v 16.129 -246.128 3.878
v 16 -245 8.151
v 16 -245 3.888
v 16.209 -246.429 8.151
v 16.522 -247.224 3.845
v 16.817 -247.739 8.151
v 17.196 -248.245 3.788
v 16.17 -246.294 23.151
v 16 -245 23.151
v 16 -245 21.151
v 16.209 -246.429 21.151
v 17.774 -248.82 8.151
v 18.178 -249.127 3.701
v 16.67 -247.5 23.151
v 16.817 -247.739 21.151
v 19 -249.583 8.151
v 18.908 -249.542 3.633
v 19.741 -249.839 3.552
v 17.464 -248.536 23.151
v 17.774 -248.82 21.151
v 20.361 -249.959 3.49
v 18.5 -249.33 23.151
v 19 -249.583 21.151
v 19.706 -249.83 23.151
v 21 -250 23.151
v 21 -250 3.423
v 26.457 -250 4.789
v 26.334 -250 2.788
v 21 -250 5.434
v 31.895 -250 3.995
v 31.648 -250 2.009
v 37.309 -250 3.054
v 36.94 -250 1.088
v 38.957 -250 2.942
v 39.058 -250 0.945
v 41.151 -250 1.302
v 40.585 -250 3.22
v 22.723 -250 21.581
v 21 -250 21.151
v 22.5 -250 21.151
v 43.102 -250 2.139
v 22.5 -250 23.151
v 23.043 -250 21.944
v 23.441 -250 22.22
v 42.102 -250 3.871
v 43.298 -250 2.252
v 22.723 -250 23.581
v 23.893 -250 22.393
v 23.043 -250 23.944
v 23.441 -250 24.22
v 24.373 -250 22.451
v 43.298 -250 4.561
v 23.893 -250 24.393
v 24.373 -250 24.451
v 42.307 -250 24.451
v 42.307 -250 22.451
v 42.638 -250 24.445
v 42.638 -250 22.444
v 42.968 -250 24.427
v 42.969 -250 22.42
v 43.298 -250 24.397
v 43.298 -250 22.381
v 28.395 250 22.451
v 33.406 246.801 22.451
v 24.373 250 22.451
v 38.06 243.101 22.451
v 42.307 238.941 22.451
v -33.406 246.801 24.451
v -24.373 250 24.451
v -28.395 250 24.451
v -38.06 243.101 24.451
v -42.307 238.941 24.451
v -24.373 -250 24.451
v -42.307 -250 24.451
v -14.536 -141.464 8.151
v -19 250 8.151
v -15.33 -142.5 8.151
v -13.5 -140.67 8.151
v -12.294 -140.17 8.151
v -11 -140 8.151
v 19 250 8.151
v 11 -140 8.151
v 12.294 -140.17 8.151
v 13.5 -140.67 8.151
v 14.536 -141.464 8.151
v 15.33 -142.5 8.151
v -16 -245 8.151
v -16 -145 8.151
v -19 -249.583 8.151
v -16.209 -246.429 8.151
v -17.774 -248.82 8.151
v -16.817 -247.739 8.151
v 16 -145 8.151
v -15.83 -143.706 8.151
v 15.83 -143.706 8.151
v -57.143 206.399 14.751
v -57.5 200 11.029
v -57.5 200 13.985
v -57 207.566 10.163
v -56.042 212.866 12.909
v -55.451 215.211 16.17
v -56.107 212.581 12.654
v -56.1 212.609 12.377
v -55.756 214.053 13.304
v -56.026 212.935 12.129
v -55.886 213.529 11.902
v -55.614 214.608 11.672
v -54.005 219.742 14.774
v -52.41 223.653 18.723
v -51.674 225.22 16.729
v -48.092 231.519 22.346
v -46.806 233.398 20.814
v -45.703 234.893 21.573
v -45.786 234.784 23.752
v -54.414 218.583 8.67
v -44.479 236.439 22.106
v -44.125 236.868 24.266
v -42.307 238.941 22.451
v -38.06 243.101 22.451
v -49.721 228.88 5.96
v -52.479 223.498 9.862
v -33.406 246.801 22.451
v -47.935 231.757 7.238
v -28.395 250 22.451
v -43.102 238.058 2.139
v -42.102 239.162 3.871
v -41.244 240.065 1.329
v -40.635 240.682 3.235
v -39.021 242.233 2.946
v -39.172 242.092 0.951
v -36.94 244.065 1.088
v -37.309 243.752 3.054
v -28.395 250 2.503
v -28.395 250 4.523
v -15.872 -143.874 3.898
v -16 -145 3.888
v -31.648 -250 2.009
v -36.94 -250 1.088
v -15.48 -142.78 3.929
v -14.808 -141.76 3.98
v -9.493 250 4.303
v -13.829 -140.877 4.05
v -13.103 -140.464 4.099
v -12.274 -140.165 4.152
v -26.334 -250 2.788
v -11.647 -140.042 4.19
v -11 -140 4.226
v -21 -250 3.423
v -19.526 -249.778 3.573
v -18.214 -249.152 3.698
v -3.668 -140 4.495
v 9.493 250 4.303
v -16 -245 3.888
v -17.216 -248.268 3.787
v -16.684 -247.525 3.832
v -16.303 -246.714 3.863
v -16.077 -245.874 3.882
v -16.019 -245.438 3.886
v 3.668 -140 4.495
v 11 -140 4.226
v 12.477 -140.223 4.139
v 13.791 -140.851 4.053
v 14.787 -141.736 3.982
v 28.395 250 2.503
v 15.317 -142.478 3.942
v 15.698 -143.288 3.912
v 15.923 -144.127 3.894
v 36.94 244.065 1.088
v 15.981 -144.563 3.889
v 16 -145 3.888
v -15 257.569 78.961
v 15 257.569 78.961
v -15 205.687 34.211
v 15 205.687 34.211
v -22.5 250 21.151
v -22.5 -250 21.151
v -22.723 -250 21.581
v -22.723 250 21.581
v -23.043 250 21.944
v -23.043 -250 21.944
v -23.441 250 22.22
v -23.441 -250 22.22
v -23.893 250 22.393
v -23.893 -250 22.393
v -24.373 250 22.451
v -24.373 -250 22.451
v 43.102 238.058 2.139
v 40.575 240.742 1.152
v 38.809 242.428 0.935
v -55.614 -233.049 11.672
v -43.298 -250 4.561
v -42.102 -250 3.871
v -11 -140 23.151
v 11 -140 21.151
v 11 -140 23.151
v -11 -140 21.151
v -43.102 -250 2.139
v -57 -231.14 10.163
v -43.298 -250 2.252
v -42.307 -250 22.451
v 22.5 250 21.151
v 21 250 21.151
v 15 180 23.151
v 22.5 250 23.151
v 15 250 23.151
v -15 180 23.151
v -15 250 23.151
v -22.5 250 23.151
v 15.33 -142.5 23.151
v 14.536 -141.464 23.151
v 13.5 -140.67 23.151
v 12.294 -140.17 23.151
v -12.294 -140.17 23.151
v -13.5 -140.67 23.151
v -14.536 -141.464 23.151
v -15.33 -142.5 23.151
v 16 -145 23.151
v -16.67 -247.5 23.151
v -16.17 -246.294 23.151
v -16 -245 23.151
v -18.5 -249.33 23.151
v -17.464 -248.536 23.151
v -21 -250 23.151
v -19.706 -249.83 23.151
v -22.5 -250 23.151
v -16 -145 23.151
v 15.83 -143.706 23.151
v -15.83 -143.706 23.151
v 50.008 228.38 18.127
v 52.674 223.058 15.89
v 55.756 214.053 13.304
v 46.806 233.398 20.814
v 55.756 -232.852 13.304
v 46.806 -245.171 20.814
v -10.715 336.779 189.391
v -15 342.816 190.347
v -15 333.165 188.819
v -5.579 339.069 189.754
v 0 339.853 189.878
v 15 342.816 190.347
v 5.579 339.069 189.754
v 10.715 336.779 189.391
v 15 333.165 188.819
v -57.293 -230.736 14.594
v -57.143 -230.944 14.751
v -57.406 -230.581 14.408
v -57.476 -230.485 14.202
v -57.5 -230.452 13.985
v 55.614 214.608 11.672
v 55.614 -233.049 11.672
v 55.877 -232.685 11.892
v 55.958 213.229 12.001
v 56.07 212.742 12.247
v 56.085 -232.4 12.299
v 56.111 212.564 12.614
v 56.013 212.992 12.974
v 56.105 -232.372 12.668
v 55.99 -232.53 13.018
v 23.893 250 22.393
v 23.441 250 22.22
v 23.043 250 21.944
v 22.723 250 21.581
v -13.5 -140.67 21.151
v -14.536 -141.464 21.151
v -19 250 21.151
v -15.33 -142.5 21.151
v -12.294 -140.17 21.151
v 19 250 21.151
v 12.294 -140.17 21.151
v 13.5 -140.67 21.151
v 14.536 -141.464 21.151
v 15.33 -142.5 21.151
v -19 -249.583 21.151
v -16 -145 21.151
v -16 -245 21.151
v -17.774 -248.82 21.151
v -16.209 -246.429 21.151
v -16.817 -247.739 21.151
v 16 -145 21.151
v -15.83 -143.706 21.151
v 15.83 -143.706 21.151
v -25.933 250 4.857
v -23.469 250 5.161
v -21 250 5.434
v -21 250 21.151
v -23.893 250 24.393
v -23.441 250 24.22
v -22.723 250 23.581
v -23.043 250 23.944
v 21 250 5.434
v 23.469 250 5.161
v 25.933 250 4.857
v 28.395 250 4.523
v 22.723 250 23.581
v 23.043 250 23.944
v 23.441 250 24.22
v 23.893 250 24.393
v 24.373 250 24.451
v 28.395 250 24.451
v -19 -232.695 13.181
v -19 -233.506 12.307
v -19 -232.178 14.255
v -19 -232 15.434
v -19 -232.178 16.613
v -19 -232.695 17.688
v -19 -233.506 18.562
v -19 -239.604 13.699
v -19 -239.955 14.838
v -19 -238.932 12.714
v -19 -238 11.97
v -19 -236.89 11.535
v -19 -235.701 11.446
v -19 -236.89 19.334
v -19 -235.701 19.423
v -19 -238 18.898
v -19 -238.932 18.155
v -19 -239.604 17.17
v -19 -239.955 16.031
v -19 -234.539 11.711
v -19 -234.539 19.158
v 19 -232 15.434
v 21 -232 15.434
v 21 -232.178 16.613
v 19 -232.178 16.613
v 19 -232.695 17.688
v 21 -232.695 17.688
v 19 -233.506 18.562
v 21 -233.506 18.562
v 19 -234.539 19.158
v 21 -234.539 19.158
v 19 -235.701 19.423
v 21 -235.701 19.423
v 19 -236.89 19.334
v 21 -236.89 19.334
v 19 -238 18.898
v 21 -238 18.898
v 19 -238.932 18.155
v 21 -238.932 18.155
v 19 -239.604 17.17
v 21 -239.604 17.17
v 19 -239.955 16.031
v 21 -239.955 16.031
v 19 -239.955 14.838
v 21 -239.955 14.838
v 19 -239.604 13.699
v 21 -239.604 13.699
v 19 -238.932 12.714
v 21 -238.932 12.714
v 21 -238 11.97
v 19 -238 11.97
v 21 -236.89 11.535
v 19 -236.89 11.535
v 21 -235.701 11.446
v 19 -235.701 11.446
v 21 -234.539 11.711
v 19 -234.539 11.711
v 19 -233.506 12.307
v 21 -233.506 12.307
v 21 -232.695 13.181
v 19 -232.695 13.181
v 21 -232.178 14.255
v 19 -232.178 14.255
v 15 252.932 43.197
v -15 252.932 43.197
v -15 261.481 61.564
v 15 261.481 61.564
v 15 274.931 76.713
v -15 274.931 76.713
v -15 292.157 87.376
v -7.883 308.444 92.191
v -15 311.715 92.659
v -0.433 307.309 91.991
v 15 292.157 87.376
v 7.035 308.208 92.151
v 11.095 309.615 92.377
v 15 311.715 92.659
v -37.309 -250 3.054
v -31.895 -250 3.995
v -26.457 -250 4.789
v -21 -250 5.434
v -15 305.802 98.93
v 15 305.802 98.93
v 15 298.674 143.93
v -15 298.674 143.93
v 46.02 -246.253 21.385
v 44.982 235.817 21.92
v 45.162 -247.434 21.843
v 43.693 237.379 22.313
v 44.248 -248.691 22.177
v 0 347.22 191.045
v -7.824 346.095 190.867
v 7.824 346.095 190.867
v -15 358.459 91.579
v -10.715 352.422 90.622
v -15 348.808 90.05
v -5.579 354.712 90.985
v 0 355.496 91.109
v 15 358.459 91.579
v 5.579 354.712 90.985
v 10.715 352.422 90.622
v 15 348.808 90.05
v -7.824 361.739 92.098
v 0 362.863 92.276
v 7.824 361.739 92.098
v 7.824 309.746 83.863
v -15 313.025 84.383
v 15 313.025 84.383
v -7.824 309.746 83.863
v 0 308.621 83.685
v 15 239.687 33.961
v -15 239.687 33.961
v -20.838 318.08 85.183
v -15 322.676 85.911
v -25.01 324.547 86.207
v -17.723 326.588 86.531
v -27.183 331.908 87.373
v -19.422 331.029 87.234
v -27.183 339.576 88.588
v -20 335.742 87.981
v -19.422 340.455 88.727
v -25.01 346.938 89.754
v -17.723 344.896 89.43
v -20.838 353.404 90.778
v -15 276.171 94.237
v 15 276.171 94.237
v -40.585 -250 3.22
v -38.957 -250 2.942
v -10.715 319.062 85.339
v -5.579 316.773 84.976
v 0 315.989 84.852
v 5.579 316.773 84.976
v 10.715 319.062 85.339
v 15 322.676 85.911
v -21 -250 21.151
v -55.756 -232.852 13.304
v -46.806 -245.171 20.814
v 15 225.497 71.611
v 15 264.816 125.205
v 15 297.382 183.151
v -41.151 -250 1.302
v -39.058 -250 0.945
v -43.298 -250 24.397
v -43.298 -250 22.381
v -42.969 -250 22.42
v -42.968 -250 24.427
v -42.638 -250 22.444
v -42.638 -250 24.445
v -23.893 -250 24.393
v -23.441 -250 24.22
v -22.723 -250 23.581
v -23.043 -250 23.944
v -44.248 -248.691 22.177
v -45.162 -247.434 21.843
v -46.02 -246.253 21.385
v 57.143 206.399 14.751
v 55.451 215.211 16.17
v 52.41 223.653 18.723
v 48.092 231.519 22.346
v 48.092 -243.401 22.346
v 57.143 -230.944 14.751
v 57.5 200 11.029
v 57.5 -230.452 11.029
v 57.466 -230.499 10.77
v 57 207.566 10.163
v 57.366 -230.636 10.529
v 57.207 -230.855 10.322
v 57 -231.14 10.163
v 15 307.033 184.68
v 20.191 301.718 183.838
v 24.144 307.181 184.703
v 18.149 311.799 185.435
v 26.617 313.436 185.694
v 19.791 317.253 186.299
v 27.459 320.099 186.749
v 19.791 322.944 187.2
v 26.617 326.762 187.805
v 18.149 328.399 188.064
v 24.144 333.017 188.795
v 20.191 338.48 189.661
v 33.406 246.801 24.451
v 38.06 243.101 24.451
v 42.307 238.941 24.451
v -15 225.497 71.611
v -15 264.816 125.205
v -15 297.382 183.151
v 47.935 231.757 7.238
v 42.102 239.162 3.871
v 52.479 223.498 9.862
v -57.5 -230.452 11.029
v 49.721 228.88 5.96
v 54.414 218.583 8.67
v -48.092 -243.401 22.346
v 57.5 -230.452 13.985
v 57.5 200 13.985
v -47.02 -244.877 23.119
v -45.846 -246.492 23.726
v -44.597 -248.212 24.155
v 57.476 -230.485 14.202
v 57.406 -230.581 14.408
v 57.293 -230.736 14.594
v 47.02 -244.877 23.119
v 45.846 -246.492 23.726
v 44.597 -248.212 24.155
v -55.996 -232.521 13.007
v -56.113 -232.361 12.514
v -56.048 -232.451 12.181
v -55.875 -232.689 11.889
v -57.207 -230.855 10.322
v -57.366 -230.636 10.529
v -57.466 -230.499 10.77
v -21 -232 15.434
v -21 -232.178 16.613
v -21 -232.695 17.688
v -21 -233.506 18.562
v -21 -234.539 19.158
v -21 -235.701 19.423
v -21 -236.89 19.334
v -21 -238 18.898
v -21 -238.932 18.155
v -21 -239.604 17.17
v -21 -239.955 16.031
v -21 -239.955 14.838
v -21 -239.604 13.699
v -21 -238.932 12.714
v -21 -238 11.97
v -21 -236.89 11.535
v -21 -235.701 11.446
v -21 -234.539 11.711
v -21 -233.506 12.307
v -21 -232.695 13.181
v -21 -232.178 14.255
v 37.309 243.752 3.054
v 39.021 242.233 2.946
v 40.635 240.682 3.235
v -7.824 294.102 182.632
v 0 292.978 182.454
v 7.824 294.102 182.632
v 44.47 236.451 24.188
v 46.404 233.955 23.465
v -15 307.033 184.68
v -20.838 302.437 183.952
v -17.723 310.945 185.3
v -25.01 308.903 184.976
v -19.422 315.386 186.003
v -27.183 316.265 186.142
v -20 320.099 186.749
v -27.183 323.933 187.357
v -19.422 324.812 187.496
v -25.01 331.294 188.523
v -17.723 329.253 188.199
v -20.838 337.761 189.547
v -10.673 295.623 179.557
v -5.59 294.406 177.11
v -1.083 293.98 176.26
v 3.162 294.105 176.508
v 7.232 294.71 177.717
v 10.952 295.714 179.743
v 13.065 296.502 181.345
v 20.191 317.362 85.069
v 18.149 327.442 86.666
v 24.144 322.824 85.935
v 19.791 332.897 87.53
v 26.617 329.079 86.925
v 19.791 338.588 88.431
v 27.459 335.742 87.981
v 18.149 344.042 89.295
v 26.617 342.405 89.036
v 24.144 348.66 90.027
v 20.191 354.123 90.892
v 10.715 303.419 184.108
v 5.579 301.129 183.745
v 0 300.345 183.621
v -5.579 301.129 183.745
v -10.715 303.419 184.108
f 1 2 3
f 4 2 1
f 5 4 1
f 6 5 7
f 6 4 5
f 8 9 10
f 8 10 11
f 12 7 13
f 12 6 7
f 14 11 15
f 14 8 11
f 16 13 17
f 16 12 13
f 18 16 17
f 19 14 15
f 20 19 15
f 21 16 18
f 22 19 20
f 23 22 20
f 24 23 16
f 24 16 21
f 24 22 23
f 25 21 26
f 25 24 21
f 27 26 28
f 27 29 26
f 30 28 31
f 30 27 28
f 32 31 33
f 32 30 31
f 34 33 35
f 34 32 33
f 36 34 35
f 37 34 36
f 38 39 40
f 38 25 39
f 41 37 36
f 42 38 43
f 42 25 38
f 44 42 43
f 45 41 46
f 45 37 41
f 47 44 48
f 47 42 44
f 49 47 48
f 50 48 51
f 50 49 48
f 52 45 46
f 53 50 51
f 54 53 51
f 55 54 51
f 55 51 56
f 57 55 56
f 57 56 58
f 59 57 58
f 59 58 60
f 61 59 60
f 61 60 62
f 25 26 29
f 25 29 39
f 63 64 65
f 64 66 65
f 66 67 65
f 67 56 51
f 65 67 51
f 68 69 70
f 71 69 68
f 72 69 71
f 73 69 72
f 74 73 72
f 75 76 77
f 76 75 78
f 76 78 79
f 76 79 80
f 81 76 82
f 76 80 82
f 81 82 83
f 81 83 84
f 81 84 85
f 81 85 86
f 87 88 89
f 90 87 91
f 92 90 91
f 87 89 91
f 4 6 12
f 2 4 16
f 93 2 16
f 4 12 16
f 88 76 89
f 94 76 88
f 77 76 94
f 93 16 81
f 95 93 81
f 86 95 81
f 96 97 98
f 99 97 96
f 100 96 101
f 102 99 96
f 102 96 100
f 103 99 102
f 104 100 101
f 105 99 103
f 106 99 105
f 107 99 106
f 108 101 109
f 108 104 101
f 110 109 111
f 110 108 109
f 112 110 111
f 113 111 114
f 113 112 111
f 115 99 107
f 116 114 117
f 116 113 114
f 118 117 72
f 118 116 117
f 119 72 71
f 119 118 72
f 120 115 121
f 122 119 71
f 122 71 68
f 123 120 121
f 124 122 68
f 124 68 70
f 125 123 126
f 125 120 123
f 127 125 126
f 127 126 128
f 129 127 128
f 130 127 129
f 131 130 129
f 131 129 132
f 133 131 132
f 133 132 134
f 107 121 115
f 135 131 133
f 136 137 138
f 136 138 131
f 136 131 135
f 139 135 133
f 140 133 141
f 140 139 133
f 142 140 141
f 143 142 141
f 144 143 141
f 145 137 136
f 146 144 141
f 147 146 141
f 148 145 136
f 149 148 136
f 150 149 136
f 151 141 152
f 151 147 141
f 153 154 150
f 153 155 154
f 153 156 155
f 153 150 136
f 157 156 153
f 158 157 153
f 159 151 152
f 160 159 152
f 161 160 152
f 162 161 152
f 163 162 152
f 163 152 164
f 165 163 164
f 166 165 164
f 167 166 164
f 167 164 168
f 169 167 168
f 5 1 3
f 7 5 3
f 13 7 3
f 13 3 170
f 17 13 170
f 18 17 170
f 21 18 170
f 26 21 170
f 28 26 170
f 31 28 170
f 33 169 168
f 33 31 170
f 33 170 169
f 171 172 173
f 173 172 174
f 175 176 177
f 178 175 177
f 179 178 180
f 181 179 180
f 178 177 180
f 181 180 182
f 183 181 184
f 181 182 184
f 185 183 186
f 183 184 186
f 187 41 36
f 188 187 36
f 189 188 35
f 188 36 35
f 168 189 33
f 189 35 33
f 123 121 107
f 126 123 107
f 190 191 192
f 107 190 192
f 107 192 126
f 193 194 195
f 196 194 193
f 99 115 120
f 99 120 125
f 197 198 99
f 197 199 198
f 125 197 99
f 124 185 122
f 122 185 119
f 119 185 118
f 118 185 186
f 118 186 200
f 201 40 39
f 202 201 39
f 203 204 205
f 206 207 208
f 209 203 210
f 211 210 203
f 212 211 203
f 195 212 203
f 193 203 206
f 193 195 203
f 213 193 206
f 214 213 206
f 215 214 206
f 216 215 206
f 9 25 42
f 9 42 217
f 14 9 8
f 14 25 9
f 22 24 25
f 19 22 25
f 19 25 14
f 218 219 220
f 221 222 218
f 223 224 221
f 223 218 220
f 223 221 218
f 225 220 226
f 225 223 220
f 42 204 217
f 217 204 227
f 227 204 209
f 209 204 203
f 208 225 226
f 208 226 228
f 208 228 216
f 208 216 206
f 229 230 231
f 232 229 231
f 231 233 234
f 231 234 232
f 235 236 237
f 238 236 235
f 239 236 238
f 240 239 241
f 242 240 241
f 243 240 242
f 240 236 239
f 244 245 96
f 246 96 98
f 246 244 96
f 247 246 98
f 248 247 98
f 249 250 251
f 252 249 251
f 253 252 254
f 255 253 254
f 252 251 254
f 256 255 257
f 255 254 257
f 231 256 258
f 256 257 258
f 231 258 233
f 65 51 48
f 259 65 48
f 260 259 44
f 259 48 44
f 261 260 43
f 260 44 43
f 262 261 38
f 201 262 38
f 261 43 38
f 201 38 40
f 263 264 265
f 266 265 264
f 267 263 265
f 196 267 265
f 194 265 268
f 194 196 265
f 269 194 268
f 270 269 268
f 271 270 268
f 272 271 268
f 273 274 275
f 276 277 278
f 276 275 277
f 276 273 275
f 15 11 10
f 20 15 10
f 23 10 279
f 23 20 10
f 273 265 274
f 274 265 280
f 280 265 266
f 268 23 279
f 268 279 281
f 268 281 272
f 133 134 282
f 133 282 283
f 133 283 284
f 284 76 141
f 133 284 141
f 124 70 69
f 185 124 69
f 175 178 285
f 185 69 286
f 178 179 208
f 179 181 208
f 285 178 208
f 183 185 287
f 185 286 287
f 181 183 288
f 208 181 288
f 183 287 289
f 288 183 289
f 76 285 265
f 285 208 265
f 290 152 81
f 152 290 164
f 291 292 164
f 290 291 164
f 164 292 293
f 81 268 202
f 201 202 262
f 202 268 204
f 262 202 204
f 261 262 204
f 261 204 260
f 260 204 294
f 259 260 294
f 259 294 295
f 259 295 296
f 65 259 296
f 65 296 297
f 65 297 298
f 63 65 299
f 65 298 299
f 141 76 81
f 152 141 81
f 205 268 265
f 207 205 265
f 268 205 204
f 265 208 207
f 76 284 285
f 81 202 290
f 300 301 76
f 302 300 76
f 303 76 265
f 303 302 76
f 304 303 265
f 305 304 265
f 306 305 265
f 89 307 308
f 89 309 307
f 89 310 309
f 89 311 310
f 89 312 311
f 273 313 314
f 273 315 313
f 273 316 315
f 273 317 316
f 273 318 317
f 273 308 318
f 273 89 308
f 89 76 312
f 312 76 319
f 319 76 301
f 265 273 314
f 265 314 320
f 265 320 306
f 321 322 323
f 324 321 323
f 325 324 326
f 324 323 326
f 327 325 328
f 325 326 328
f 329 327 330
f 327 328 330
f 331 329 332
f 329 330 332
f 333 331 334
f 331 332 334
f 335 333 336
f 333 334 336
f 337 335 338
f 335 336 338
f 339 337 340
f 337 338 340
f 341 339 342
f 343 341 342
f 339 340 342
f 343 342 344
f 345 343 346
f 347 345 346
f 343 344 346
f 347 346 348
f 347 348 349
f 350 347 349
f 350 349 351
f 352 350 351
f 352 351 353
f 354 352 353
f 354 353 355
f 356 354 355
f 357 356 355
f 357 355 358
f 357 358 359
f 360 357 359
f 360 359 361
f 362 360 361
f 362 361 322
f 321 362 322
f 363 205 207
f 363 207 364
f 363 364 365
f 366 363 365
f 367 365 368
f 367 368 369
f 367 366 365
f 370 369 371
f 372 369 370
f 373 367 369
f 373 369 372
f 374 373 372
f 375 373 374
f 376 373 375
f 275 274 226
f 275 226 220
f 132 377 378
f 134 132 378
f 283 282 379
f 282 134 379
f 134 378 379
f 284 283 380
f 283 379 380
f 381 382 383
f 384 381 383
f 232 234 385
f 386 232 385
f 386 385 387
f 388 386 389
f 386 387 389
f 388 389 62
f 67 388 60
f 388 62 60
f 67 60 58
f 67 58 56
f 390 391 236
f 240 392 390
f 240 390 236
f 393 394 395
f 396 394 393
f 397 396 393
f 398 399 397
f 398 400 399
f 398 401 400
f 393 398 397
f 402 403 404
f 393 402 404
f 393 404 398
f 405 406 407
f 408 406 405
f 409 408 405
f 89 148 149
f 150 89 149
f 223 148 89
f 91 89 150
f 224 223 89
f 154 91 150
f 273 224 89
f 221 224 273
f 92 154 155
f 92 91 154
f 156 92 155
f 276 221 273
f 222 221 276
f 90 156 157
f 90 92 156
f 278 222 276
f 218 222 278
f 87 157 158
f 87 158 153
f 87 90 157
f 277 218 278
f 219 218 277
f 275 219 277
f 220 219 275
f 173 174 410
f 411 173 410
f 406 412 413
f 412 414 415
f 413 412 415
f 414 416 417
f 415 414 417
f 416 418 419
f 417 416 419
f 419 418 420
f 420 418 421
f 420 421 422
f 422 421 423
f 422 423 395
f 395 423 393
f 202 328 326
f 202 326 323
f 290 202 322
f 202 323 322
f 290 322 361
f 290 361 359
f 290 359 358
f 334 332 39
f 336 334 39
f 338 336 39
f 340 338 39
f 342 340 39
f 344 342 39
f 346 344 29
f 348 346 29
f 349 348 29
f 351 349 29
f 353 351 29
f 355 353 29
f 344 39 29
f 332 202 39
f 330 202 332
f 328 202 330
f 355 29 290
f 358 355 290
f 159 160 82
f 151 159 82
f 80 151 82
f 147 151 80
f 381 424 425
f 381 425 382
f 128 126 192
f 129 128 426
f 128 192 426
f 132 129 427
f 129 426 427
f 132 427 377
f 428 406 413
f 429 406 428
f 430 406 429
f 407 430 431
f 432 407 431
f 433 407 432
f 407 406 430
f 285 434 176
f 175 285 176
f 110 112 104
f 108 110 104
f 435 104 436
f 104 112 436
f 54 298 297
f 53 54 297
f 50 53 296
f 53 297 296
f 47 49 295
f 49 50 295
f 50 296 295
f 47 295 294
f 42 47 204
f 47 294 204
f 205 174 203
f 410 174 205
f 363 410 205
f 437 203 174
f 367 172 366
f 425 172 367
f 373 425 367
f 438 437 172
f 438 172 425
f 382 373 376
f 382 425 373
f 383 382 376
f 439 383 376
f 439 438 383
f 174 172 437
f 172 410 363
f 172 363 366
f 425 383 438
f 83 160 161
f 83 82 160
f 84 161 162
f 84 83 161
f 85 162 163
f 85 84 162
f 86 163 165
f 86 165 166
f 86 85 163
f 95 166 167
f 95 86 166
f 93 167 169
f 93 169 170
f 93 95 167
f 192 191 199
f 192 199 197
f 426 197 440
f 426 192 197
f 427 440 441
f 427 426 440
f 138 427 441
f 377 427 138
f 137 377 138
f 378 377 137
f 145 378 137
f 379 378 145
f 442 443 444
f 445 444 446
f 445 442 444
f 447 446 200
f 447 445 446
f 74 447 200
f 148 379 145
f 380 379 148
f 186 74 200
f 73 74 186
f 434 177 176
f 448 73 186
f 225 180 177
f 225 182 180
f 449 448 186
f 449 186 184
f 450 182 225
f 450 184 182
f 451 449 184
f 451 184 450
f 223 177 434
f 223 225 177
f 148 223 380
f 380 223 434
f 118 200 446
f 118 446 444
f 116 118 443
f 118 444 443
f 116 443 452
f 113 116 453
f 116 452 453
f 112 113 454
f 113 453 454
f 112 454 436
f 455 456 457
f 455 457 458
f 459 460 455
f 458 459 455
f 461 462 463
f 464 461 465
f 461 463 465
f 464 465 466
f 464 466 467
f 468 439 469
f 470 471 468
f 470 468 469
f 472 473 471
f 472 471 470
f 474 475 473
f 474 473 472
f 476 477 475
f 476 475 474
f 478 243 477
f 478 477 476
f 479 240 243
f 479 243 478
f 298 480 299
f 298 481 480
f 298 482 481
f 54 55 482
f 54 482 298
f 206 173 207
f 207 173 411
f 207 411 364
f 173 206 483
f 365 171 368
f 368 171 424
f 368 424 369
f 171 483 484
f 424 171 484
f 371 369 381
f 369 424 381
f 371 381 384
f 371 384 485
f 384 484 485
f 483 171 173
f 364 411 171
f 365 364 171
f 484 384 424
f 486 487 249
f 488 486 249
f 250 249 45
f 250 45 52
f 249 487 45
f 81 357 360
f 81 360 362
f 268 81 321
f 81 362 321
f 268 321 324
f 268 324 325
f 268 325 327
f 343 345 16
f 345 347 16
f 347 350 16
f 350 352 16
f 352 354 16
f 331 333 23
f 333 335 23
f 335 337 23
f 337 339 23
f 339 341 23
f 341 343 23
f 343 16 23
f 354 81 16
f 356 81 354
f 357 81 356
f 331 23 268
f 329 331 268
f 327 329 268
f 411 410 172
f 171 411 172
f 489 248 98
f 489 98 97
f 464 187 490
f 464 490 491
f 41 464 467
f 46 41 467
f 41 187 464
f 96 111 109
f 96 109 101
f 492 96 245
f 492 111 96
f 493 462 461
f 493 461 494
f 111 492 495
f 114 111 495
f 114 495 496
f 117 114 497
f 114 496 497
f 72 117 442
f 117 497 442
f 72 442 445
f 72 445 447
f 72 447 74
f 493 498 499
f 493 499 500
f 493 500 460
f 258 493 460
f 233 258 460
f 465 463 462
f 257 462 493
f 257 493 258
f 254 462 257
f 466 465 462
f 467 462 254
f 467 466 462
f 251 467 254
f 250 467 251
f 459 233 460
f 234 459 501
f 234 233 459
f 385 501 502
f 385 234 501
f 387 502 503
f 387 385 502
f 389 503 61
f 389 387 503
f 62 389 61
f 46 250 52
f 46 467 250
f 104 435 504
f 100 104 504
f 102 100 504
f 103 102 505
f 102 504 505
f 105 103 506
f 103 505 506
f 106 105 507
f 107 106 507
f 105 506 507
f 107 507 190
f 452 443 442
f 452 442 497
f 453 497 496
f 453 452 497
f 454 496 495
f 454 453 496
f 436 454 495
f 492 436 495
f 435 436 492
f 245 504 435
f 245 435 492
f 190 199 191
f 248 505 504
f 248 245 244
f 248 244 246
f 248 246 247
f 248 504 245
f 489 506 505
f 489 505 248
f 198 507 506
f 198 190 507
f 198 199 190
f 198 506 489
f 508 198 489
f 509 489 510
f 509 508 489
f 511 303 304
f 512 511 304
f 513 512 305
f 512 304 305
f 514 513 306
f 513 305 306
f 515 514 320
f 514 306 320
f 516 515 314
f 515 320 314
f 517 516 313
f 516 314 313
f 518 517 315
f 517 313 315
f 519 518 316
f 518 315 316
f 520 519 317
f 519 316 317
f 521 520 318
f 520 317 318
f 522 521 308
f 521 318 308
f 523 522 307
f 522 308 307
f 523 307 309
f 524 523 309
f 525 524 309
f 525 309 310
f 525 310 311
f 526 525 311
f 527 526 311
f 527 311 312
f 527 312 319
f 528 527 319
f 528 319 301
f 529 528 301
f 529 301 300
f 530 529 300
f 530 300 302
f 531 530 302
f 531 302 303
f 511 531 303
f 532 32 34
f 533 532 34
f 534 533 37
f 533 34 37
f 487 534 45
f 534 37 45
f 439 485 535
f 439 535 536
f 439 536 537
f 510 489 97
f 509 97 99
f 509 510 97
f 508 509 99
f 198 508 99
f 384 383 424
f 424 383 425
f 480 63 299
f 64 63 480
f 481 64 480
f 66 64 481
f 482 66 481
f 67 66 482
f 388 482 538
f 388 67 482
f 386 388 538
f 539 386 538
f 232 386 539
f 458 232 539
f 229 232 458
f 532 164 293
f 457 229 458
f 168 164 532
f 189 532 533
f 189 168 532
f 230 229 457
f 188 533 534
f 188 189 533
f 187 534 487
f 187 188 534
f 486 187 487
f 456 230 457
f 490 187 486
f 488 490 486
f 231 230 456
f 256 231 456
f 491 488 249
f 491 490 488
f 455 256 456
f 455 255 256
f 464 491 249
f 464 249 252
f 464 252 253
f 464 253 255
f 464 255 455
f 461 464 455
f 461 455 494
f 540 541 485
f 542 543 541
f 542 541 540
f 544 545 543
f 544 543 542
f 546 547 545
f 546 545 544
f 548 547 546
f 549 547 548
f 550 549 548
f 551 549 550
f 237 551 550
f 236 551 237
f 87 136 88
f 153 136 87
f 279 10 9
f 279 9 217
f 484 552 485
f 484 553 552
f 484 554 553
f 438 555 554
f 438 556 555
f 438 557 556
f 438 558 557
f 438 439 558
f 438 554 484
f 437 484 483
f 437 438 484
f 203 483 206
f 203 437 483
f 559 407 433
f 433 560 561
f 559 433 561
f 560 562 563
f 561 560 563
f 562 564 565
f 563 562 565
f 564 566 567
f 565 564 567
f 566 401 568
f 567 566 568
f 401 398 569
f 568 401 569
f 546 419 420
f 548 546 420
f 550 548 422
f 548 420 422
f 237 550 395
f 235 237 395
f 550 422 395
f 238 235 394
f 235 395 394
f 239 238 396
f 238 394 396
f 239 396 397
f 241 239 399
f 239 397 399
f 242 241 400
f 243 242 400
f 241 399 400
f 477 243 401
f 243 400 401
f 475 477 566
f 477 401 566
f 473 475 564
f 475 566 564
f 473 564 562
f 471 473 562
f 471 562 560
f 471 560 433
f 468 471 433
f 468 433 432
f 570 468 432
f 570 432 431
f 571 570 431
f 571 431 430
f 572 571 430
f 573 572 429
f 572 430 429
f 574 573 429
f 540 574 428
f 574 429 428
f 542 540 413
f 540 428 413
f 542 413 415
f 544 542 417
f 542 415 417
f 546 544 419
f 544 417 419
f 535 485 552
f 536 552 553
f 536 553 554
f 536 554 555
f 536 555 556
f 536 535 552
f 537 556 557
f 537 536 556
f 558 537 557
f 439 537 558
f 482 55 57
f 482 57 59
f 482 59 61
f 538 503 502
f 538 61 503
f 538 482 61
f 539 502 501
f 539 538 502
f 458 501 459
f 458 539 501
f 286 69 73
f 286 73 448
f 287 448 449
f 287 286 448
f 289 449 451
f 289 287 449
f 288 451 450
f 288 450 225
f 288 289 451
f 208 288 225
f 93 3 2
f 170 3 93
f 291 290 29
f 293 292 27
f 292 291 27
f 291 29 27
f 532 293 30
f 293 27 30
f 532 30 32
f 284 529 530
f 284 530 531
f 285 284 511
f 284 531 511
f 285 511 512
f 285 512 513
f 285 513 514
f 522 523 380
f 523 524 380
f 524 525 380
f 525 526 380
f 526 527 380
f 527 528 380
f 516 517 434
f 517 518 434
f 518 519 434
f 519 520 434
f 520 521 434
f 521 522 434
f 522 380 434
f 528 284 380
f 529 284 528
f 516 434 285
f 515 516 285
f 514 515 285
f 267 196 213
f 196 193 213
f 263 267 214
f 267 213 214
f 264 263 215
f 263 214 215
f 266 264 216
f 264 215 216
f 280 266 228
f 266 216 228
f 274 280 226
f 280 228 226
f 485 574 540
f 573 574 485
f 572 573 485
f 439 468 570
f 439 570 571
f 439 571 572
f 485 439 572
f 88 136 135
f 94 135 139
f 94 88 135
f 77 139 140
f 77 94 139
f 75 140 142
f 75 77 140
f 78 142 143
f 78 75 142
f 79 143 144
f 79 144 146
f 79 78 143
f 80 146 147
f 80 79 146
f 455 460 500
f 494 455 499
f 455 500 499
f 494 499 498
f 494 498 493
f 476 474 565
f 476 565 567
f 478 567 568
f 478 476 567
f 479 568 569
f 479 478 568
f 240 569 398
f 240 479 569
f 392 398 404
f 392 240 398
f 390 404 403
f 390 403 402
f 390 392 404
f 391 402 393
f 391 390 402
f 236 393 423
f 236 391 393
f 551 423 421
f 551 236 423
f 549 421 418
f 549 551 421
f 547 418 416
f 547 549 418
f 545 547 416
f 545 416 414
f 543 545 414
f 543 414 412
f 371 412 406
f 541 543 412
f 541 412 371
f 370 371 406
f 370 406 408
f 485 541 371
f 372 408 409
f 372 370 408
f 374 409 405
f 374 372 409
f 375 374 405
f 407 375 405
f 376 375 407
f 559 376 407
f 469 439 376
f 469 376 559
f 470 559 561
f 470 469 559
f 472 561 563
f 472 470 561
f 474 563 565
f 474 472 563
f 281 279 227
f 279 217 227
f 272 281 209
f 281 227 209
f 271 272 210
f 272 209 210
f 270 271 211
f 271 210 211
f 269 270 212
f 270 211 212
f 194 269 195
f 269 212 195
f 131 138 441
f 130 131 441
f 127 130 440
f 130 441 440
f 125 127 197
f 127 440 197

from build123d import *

# Parameters (mm, degrees)
F1_DEPTH       = 250
F2_W           = 38
F2_H           = 13
F3_DEPTH       = 250
F4_T1_DEPTH    = 509.3674969976
F5_R           = 9
F6_R           = 1
F8_DEPTH       = 500.001
F10_DEPTH      = 24.4523840141
F10_DEPTH_BACK = 527
F12_DEPTH      = 527
F12_DEPTH_BACK = 24.4523841141
F13_F1_R       = 4.9999
F13_F2_R       = 4.9999
F13_F3_R       = 5
F13_F4_R       = 5
F13_F5_R       = 5
F13_F6_R       = 5
F15_DEPTH      = 15
F16_R          = 27.4590604355
F17_DEPTH      = 100
F19_D          = 40
F21_D          = 8
F21_DEPTH      = 50
F21_TIP        = 2.4034424761
F23_DEPTH      = 72.5010001


# Not quite as in the source:
# - a fillet or chamfer that OpenCascade refuses, or shapes differently, is made with other operations: its cross-section is extruded or revolved along the edge and cut away or added
# - a fillet or chamfer is up to 0.001 mm smaller than in the source, because OpenCascade refuses the exact size
# - an extrude ends at something that could not be found from the text; its depth is read off the source's solid


with BuildPart() as f1:
    # F0 (on Front) → F1 (new body, symmetric)
    with BuildSketch(Plane.XZ):
        with BuildLine():
            Line((22.5, 23.1513840141), (0, 23.1513840141))
            Line((0, 23.1513840141), (-22.5, 23.1513840141))
            Line((-22.5, 23.1513840141), (-22.5, 24.4513840141))
            Line((-22.5, 24.4513840141), (-45.5824640741, 24.4513840141))
            Line((-45.5824640741, 24.4513840141), (-57.5, 14.4513840141))
            Line((-57.5, 14.4513840141), (-57.5, 10.4513840141))
            Line((-57.5, 10.4513840141), (-40.1794919243, 0.4513840141))
            ThreePointArc((-40.1794919243, 0.4513840141), (0, 4.5289288725), (40.1794919243, 0.4513840141))
            Line((40.1794919243, 0.4513840141), (57.5, 10.4513840141))
            Line((57.5, 10.4513840141), (57.5, 14.4513840141))
            Line((57.5, 14.4513840141), (45.5824640741, 24.4513840141))
            Line((45.5824640741, 24.4513840141), (22.5, 24.4513840141))
            Line((22.5, 24.4513840141), (22.5, 23.1513840141))
        make_face()
    extrude(amount=F1_DEPTH, both=True)

    # F2 (on Front) → F3 (cut, symmetric)
    with BuildSketch(Plane.XZ):
        with Locations((0, 14.6513840141)):
            Rectangle(F2_W, F2_H)
    extrude(amount=F3_DEPTH, both=True, mode=Mode.SUBTRACT)

    # F4: fillet of radius 2 on 2 edges, made by hand

    # F4_s2 → F4_t1 (cut)
    with BuildSketch(Plane.XZ.offset(-254.6837484988)):
        with BuildLine():
            ThreePointArc((-24.3734993995, 24.4513840141), (-23.2333239744, 24.0945516866), (-22.5, 23.1513840141))
            Line((-22.5, 23.1513840141), (-22.5, 24.4513840141))
            Line((-22.5, 24.4513840141), (-24.3734993995, 24.4513840141))
        make_face()
        with BuildLine():
            ThreePointArc((24.3734993995, 24.4513840141), (23.2333239744, 24.0945516866), (22.5, 23.1513840141))
            Line((22.5, 23.1513840141), (22.5, 24.4513840141))
            Line((22.5, 24.4513840141), (24.3734993995, 24.4513840141))
        make_face()
    extrude(amount=F4_T1_DEPTH, mode=Mode.SUBTRACT)

    # F5
    f5_edges = [f1.edges().sort_by_distance(p)[0] for p in [
        (-45.582464, 0, 24.451384),
        (-40.179492, 0, 0.451384),
        (40.179492, 0, 0.451384),
        (45.582464, 0, 24.451384),
    ]]
    fillet(f5_edges, radius=F5_R)

    # F6
    f6_edges = [f1.edges().sort_by_distance(p)[0] for p in [
        (57.5, 0, 14.451384),
        (57.5, 0, 10.451384),
        (-57.5, 0, 10.451384),
        (-57.5, 0, 14.451384),
    ]]
    fillet(f6_edges, radius=F6_R)

    # F7 (on face) → F8 (cut, through all)
    with BuildSketch(Plane.XZ.offset(250)):
        with BuildLine():
            ThreePointArc((-42.1022690923, 3.8709010064), (-39.7790673433, 3.0327059534), (-37.3093701274, 3.0535140017))
            ThreePointArc((-37.3093701274, 3.0535140017), (-29.1789785809, 4.4103617496), (-21, 5.4343792715))
            Line((-21, 5.4343792715), (-21, 21.1513840141))
            Line((-21, 21.1513840141), (-22.5, 21.1513840141))
            ThreePointArc((-22.5, 21.1513840141), (-23.2333239744, 22.0945516866), (-24.3734993995, 22.4513840141))
            Line((-24.3734993995, 22.4513840141), (-42.3067319657, 22.4513840141))
            ThreePointArc((-42.3067319657, 22.4513840141), (-44.7008729689, 22.0292323596), (-46.8062452335, 20.813695116))
            Line((-46.8062452335, 20.813695116), (-55.7563117574, 13.3036975967))
            ThreePointArc((-55.7563117574, 13.3036975967), (-56.1097188459, 12.4504974108), (-55.6135241478, 11.6716277498))
            Line((-55.6135241478, 11.6716277498), (-42.1022690923, 3.8709010064))
        make_face()
        with BuildLine():
            Line((21, 21.1513840141), (21, 5.4343792715))
            ThreePointArc((21, 5.4343792715), (29.1789785809, 4.4103617496), (37.3093701274, 3.0535140017))
            ThreePointArc((37.3093701274, 3.0535140017), (39.7790673433, 3.0327059534), (42.1022690923, 3.8709010064))
            Line((42.1022690923, 3.8709010064), (55.6135241478, 11.6716277498))
            ThreePointArc((55.6135241478, 11.6716277498), (56.1097188459, 12.4504974108), (55.7563117574, 13.3036975967))
            Line((55.7563117574, 13.3036975967), (46.8062452335, 20.813695116))
            ThreePointArc((46.8062452335, 20.813695116), (44.7008729689, 22.0292323596), (42.3067319657, 22.4513840141))
            Line((42.3067319657, 22.4513840141), (24.3734993995, 22.4513840141))
            ThreePointArc((24.3734993995, 22.4513840141), (23.2333239744, 22.0945516866), (22.5, 21.1513840141))
            Line((22.5, 21.1513840141), (21, 21.1513840141))
        make_face()
    extrude(amount=-F8_DEPTH, mode=Mode.SUBTRACT)

    # F9 (on Top) → F10 (cut, two sides)
    with BuildSketch(Plane.XY) as f10_sk:
        with BuildLine():
            ThreePointArc((-57.5, 200), (0, 257.5), (57.5, 200))
            Line((57.5, 200), (57.5, 280))
            Line((57.5, 280), (-57.5, 280))
            Line((-57.5, 280), (-57.5, 200))
        make_face()
    extrude(amount=F10_DEPTH, mode=Mode.SUBTRACT)
    extrude(f10_sk.sketch, amount=-F10_DEPTH_BACK, mode=Mode.SUBTRACT)

    # F11 (on Top) → F12 (cut, two sides)
    with BuildSketch(Plane.XY) as f12_sk:
        Polygon((-43.2975540478, -250), (-68, -216), (-68, -346), (68, -346), (68, -216), (43.2975540478, -250), (16, -250), (16, -140), (-16, -140), (-16, -250), align=None)
    extrude(amount=-F12_DEPTH, mode=Mode.SUBTRACT)
    extrude(f12_sk.sketch, amount=F12_DEPTH_BACK, mode=Mode.SUBTRACT)

    # F13: fillet of radius 5 on 8 edges, made by hand

    # F13_f1 (radius 5 in the source; OpenCascade refuses exactly that, so slightly less here)
    f13_f1_edges = [f1.edges().sort_by_distance(p)[0] for p in [
        (-16, -250, 22.1513840141),
    ]]
    fillet(f13_f1_edges, radius=F13_F1_R)

    # F13_f2 (radius 5 in the source; OpenCascade refuses exactly that, so slightly less here)
    f13_f2_edges = [f1.edges().sort_by_distance(p)[0] for p in [
        (16, -250, 6.0196427984),
    ]]
    fillet(f13_f2_edges, radius=F13_F2_R)

    # F13_f3
    f13_f3_edges = [f1.edges().sort_by_distance(p)[0] for p in [
        (16, -140, 22.1513840141),
    ]]
    fillet(f13_f3_edges, radius=F13_F3_R)

    # F13_f4
    f13_f4_edges = [f1.edges().sort_by_distance(p)[0] for p in [
        (-16, -140, 22.1513840141),
    ]]
    fillet(f13_f4_edges, radius=F13_F4_R)

    # F13_f5
    f13_f5_edges = [f1.edges().sort_by_distance(p)[0] for p in [
        (-16, -140, 6.0196427984),
    ]]
    fillet(f13_f5_edges, radius=F13_F5_R)

    # F13_f6
    f13_f6_edges = [f1.edges().sort_by_distance(p)[0] for p in [
        (16, -140, 6.0196427984),
    ]]
    fillet(f13_f6_edges, radius=F13_F6_R)

    # F14 (on Right) → F15 (join, symmetric)
    with BuildSketch(Plane.YZ):
        with BuildLine():
            ThreePointArc((297.3819995028, 183.1513840141), (245.9666940414, 97.8136618671), (180, 23.1513840141))
            Line((180, 23.1513840141), (250, 23.1513840141))
            ThreePointArc((250, 23.1513840141), (267.6550746197, 69.6272787008), (311.7145367693, 92.6593051387))
            Line((311.7145367693, 92.6593051387), (313.0254460068, 84.3825499546))
            Line((313.0254460068, 84.3825499546), (358.4591096742, 91.5785353465))
            Line((358.4591096742, 91.5785353465), (342.8156631702, 190.347369406))
            Line((342.8156631702, 190.347369406), (297.3819995028, 183.1513840141))
        make_face()
    extrude(amount=F15_DEPTH, both=True)

    # F16 (on face) → F17 (join, through all)
    with BuildSketch(Plane(origin=(0, -21.0209895784, 132.7213047908), x_dir=(1, 0, 0), z_dir=(0, -0.156434465, 0.9876883406))):
        with Locations((0, 345.3719223914)):
            Circle(F16_R)
    extrude(amount=-F17_DEPTH)

    # F19 (through all)
    with Locations(Plane(origin=(0, -21.0209895784, 132.7213047908), x_dir=(1, 0, 0), z_dir=(0, -0.156434465, 0.9876883406))):
        with Locations((0, 345.3719223914)):
            Hole(F19_D / 2)

    # F21 (one way)
    with BuildSketch(Plane.YZ.offset(21)):
        with Locations((-236, 15.4343792715)):
            Circle(F21_D / 2)
    extrude(amount=-F21_DEPTH, mode=Mode.SUBTRACT)
    with Locations(Plane.YZ.offset(21)):
        with Locations((-236, 15.4343792715)):
            with Locations((0, 0, -(F21_DEPTH + F21_TIP / 2))):  # 118° drill point
                Cone(0, F21_D / 2, F21_TIP, mode=Mode.SUBTRACT)

    # F22 (on face) → F23 (cut, through all)
    with BuildSketch(Plane.YZ.offset(15)):
        Polygon((205.6868169308, 34.2114791274), (239.6868169308, 33.9609570801), (257.5687806787, 78.9609570801), align=None)
        Polygon((305.8015852264, 98.9295560122), (298.6742854118, 143.9295560122), (276.1709350086, 94.2365220609), align=None)
    extrude(amount=-F23_DEPTH, mode=Mode.SUBTRACT)


solid = f1.part
